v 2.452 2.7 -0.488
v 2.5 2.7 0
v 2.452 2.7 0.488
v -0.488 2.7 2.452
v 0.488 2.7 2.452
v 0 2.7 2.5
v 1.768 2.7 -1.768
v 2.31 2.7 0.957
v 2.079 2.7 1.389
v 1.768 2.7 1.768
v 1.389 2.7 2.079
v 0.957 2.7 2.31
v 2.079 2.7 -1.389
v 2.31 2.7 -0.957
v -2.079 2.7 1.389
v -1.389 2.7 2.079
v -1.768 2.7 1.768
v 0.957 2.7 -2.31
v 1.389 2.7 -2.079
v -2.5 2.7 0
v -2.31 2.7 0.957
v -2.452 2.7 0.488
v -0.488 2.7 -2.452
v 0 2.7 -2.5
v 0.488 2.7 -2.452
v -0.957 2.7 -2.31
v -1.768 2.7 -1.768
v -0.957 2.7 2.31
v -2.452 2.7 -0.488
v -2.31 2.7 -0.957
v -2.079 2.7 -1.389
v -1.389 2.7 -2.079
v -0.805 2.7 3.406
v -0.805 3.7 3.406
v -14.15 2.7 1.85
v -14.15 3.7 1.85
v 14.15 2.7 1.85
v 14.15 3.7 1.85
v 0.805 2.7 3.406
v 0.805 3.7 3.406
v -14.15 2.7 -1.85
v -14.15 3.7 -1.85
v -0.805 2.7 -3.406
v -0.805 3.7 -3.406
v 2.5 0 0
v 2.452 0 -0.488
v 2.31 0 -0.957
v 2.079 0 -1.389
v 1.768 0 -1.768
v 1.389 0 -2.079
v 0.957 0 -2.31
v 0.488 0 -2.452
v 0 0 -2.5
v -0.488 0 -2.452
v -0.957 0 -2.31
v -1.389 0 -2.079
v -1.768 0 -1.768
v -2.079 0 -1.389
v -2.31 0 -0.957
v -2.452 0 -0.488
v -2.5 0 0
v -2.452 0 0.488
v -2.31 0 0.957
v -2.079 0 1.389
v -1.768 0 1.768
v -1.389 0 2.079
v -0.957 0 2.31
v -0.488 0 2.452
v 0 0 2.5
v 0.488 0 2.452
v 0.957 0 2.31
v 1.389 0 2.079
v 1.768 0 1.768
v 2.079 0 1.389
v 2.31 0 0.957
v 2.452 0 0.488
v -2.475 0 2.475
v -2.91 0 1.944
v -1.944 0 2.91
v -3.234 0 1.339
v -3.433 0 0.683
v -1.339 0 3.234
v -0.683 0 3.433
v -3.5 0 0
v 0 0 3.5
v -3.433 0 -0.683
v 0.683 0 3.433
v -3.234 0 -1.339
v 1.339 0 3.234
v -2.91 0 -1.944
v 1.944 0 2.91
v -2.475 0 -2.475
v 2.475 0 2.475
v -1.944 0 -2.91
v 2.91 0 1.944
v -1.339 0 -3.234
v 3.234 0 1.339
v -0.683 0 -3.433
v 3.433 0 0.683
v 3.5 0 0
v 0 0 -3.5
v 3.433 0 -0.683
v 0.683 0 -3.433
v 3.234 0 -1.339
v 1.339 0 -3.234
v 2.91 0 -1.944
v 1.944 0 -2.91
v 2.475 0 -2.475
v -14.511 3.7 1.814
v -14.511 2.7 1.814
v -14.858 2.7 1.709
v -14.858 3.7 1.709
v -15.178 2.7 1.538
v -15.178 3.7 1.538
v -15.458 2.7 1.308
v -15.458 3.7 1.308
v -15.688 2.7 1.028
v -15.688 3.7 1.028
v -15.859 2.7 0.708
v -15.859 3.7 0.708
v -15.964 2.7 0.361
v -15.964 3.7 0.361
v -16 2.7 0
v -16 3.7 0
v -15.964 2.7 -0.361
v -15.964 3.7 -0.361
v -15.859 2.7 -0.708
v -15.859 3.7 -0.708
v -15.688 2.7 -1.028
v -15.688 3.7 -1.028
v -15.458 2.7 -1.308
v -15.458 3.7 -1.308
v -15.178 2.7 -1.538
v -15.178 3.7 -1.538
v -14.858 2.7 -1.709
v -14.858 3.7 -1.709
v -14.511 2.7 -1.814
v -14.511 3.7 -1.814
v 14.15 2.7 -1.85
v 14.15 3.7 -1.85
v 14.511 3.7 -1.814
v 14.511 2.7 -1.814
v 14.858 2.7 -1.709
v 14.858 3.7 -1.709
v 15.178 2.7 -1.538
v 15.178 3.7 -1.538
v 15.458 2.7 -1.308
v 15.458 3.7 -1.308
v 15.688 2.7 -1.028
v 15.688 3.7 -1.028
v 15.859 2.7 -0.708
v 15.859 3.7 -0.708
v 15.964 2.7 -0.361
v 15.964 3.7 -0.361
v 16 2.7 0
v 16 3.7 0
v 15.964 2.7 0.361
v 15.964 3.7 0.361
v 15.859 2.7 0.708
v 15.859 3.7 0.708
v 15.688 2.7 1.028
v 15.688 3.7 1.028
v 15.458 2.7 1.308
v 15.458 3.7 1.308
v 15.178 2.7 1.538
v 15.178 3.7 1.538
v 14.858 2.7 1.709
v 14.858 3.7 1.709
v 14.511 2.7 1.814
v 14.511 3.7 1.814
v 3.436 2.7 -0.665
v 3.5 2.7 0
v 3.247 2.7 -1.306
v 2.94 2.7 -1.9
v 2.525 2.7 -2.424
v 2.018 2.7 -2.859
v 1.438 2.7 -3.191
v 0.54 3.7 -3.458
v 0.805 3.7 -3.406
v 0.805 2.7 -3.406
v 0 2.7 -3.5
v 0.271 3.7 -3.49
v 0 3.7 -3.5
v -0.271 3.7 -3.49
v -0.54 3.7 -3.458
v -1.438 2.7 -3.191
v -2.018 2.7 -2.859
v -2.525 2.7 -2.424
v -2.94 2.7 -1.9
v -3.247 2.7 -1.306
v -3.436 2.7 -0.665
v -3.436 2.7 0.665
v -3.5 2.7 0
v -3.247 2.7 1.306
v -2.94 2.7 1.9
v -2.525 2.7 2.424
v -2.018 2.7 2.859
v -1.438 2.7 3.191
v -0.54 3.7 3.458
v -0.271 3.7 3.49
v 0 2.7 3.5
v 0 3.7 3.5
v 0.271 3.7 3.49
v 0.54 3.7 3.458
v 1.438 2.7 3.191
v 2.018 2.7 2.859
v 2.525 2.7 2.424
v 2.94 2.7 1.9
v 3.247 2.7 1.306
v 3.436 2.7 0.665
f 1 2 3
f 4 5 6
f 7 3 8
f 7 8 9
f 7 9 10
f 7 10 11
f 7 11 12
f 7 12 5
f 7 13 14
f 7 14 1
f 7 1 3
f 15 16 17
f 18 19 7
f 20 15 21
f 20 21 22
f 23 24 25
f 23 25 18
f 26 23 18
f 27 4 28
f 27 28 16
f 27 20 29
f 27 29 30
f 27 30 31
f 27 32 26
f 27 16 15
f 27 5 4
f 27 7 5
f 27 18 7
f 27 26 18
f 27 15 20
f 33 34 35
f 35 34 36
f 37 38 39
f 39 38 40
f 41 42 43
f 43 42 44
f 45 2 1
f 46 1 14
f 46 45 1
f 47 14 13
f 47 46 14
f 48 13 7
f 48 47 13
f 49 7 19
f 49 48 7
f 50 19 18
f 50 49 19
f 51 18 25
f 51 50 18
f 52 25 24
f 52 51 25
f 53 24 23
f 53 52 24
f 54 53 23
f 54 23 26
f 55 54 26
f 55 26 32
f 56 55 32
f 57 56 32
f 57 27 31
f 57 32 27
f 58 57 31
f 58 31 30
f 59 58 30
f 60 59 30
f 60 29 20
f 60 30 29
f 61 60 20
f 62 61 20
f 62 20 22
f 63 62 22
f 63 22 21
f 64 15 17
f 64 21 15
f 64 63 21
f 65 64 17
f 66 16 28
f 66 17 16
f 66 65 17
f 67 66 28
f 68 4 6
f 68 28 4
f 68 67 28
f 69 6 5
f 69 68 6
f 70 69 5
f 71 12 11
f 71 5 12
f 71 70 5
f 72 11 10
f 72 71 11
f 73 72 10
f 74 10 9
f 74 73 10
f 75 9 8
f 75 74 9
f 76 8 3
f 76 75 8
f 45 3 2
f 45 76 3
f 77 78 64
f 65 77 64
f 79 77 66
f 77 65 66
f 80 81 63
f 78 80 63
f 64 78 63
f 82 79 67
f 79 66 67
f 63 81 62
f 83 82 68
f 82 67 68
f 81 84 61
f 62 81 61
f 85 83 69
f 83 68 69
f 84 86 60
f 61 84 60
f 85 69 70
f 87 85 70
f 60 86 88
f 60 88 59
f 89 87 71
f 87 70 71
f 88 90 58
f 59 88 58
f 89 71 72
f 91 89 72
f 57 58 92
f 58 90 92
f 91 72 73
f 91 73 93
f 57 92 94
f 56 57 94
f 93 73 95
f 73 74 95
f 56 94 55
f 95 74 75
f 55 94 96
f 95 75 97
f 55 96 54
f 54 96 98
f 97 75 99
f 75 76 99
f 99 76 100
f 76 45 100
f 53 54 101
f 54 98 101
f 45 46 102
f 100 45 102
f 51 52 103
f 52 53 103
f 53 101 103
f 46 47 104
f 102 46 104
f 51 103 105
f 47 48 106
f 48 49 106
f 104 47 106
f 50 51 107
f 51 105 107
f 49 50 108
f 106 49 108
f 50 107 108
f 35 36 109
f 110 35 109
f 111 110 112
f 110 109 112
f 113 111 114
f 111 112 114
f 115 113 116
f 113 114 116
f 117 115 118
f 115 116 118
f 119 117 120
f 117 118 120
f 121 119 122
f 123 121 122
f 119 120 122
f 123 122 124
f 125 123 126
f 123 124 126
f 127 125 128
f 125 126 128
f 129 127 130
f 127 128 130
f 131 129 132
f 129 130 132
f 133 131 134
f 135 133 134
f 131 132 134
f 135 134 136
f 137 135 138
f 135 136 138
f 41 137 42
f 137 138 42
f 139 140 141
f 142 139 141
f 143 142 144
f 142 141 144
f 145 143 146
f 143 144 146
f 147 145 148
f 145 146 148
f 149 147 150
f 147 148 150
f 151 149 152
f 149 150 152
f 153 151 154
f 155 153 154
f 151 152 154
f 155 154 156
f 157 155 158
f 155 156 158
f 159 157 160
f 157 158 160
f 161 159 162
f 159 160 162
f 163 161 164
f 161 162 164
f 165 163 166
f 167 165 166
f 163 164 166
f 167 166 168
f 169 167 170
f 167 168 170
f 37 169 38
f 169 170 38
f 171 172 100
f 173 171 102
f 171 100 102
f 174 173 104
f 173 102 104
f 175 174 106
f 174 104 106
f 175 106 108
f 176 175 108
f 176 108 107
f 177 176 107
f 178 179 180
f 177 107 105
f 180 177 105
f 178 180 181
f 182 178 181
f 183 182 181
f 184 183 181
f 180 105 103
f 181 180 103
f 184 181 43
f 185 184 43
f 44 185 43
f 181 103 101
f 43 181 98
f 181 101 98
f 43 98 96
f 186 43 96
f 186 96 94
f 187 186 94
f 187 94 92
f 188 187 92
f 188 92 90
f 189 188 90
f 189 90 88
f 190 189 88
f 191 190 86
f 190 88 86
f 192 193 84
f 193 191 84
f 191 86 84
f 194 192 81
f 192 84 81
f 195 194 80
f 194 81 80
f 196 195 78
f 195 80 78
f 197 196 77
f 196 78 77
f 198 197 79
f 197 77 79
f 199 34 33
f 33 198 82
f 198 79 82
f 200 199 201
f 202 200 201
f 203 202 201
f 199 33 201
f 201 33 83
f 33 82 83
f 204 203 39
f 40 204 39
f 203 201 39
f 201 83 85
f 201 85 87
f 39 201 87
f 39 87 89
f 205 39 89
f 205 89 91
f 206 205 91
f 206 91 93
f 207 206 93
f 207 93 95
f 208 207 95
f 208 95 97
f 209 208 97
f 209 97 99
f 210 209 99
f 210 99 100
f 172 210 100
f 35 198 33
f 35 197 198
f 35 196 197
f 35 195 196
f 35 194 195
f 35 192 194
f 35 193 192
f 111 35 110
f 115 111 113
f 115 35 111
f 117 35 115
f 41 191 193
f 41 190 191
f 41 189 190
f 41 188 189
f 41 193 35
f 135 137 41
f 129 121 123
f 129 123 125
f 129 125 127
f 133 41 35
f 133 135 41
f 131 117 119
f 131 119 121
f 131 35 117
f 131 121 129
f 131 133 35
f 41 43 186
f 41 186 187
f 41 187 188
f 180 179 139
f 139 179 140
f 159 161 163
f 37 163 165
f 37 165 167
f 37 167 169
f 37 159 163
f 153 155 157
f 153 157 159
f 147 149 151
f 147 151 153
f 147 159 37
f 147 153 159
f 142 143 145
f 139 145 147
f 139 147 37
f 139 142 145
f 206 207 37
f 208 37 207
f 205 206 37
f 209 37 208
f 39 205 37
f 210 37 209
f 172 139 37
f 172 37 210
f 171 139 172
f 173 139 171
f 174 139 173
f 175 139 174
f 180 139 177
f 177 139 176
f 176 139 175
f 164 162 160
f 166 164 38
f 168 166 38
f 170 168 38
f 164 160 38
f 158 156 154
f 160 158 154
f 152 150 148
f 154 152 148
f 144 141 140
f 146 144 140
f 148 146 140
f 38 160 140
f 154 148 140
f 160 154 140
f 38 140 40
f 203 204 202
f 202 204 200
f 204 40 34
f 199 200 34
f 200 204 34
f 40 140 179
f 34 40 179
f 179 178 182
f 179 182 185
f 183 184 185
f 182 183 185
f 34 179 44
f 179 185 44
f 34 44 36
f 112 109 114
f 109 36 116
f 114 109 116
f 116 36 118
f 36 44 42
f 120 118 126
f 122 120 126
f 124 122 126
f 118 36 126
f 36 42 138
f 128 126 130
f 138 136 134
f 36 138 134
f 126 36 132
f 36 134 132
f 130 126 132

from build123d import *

# Parameters (mm, degrees)
CROQUIS1_R              = 3.5
CROQUIS1_R_2            = 2.5
SALIENTE_EXTRUIR1_DEPTH = 3.7
SALIENTE_EXTRUIR2_DEPTH = 1


with BuildPart() as part:
    # Croquis1 → Saliente-Extruir1 (new body)
    with BuildSketch(Plane(origin=(0, 0, 0), x_dir=(1, 0, 0), z_dir=(0, 1, 0))):
        Circle(CROQUIS1_R)
        Circle(CROQUIS1_R_2, mode=Mode.SUBTRACT)
    extrude(amount=SALIENTE_EXTRUIR1_DEPTH)

    # Croquis2 → Saliente-Extruir2 (add)
    with BuildSketch(Plane(origin=(0, 3.7, 0), x_dir=(1, 0, 0), z_dir=(0, 1, 0))):
        with BuildLine():
            Line((-14.15, 1.85), (0, 3.5))
            Line((0, 3.5), (14.15, 1.85))
            ThreePointArc((14.15, 1.85), (16, 0), (14.15, -1.85))
            Line((14.15, -1.85), (0, -3.5))
            Line((0, -3.5), (-14.15, -1.85))
            ThreePointArc((-14.15, -1.85), (-16, 0), (-14.15, 1.85))
        make_face()
    extrude(amount=-SALIENTE_EXTRUIR2_DEPTH)


solid = part.part
